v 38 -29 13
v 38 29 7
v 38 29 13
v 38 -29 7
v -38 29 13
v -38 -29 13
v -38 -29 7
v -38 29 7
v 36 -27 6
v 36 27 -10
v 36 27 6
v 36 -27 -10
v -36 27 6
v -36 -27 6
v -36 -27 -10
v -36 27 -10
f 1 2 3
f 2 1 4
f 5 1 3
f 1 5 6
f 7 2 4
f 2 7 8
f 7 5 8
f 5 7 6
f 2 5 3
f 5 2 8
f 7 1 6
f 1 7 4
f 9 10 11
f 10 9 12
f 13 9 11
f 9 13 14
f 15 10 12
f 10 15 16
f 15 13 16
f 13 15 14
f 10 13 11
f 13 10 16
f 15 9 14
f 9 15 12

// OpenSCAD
// ============================================================================
// Atom Lithography Machine — Parametric OpenSCAD Module (S6.10-03)
// ============================================================================
// part_id           : S6.10-03
// parent_bom_id     : S6.10
// subsystem         : S6
// part_name         : 4 K SKY130 968-kapi capraz-anahtar coklama karti ve M4 DC kapi dagitim modulu (Exp131)
// material          : OFHC Cu
// temp_stage        : 4 K -> 20 mK
// vacuum_grade      : Kriyo-vakum
// tolerance         : ±0.2 mV kapi bias
// computed_mass_kg  : 0.24981
// envelope_mm       : 76.000 x 58.000 x 26.350
// design_maturity   : M0_M1_DETAILED_CAD_DESIGN_ONLY
// no_lab_measurement: true
// iec61508_certified: false
// semi_s2_certified : false
// Units: millimeters (mm)
// ============================================================================

$fn = 64;

// Nominal bounding envelope parameters (mm)
bbox_x = 76.0000;
bbox_y = 58.0000;
bbox_z = 26.3500;

// Part-specific parametric dimensions
n_gates = 968;
p_4k_mw = 15.4;
qty_sets = 2;
carrier_dx = 76.0;
carrier_dy = 58.0;

// Interface / port parameters (mm)
port_thermal_4k_top_bolts = 4;

module part_S6_10_03() {
  union() {
    // 4 K OFHC thermal carrier
    translate([0.000, 0.000, 10.000]) cube([76.000, 58.000, 6.000], center=true);
    // Dual SKY130 968-gate crossbar PCB stack
    translate([0.000, 0.000, -2.000]) cube([72.000, 54.000, 16.000], center=true);
  }
}

// World assembly mounting transform (global machine frame, mm / deg):
// translate([-650.000, 0.000, 703.000]) rotate([0.000, 0.000, 0.000]) part_S6_10_03();

part_S6_10_03();
